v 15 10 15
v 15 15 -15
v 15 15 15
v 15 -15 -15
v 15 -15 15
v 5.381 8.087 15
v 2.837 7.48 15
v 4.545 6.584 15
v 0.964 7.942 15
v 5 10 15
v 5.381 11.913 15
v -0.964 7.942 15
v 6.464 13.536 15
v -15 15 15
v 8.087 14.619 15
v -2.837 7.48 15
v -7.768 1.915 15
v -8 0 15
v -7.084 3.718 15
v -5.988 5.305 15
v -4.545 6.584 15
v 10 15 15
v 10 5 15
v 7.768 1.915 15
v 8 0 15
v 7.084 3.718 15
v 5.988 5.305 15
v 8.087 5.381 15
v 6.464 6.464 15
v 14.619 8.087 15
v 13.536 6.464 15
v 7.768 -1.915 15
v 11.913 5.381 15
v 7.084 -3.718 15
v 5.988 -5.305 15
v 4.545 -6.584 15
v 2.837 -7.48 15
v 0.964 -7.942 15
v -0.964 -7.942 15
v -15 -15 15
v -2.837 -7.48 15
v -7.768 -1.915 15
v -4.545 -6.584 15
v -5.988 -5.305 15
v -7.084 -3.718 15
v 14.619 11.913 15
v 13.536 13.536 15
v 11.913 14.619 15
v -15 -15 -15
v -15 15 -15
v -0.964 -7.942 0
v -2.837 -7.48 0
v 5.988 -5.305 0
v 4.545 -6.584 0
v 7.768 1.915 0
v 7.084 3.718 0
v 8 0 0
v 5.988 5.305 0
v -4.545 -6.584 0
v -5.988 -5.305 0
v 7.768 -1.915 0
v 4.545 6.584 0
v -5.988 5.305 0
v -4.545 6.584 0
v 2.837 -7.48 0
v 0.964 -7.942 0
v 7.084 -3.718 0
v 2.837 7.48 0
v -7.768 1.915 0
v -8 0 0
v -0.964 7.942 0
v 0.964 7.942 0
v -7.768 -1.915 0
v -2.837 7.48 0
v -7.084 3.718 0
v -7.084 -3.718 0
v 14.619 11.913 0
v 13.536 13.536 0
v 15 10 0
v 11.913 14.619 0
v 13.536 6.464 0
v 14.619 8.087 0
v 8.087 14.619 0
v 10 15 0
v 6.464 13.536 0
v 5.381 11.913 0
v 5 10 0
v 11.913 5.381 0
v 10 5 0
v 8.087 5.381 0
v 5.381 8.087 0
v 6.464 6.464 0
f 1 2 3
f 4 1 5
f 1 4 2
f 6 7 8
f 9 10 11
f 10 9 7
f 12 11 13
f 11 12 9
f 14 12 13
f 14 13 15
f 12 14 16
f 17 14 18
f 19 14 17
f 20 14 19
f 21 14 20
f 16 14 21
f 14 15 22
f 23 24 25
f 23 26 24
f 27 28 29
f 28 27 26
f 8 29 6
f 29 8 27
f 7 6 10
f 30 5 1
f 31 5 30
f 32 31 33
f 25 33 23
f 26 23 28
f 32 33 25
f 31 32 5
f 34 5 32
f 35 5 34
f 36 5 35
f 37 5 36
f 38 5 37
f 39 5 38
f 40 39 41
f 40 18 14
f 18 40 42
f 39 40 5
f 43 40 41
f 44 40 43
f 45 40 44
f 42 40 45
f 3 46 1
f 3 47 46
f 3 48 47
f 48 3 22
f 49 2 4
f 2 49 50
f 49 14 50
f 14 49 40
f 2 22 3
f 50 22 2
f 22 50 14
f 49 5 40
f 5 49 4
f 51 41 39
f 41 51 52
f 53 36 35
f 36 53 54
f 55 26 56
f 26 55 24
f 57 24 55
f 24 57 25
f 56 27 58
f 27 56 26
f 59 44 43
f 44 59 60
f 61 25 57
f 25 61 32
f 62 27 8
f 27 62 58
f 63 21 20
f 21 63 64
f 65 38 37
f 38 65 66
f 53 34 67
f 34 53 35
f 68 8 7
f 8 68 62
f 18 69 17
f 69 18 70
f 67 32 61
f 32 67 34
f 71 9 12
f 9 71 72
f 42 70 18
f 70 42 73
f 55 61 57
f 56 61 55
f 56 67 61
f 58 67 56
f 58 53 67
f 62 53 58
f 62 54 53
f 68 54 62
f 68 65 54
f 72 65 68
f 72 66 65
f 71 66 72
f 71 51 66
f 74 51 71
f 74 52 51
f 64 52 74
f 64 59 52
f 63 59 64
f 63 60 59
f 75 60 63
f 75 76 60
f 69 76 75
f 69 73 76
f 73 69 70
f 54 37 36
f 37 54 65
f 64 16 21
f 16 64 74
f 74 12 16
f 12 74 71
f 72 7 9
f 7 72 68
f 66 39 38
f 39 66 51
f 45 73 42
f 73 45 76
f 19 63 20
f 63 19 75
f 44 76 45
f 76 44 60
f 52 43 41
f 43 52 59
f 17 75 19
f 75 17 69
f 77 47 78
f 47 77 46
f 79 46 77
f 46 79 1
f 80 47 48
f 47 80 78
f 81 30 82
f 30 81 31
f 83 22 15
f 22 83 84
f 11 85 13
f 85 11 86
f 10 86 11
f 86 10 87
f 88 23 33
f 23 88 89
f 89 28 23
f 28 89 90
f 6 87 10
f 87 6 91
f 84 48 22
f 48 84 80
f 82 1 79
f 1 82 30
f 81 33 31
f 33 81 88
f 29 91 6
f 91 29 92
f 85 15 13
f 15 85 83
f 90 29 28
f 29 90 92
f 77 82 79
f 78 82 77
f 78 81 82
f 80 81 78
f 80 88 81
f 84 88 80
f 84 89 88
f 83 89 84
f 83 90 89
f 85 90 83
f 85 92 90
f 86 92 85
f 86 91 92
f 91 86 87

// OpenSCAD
difference() {
    cube([30, 30, 30], center = true);
    translate([0, 0, 0]) cylinder(h = 30, r = 8);
    translate([10, 10, 0]) cylinder(h = 30, r = 5);
}
